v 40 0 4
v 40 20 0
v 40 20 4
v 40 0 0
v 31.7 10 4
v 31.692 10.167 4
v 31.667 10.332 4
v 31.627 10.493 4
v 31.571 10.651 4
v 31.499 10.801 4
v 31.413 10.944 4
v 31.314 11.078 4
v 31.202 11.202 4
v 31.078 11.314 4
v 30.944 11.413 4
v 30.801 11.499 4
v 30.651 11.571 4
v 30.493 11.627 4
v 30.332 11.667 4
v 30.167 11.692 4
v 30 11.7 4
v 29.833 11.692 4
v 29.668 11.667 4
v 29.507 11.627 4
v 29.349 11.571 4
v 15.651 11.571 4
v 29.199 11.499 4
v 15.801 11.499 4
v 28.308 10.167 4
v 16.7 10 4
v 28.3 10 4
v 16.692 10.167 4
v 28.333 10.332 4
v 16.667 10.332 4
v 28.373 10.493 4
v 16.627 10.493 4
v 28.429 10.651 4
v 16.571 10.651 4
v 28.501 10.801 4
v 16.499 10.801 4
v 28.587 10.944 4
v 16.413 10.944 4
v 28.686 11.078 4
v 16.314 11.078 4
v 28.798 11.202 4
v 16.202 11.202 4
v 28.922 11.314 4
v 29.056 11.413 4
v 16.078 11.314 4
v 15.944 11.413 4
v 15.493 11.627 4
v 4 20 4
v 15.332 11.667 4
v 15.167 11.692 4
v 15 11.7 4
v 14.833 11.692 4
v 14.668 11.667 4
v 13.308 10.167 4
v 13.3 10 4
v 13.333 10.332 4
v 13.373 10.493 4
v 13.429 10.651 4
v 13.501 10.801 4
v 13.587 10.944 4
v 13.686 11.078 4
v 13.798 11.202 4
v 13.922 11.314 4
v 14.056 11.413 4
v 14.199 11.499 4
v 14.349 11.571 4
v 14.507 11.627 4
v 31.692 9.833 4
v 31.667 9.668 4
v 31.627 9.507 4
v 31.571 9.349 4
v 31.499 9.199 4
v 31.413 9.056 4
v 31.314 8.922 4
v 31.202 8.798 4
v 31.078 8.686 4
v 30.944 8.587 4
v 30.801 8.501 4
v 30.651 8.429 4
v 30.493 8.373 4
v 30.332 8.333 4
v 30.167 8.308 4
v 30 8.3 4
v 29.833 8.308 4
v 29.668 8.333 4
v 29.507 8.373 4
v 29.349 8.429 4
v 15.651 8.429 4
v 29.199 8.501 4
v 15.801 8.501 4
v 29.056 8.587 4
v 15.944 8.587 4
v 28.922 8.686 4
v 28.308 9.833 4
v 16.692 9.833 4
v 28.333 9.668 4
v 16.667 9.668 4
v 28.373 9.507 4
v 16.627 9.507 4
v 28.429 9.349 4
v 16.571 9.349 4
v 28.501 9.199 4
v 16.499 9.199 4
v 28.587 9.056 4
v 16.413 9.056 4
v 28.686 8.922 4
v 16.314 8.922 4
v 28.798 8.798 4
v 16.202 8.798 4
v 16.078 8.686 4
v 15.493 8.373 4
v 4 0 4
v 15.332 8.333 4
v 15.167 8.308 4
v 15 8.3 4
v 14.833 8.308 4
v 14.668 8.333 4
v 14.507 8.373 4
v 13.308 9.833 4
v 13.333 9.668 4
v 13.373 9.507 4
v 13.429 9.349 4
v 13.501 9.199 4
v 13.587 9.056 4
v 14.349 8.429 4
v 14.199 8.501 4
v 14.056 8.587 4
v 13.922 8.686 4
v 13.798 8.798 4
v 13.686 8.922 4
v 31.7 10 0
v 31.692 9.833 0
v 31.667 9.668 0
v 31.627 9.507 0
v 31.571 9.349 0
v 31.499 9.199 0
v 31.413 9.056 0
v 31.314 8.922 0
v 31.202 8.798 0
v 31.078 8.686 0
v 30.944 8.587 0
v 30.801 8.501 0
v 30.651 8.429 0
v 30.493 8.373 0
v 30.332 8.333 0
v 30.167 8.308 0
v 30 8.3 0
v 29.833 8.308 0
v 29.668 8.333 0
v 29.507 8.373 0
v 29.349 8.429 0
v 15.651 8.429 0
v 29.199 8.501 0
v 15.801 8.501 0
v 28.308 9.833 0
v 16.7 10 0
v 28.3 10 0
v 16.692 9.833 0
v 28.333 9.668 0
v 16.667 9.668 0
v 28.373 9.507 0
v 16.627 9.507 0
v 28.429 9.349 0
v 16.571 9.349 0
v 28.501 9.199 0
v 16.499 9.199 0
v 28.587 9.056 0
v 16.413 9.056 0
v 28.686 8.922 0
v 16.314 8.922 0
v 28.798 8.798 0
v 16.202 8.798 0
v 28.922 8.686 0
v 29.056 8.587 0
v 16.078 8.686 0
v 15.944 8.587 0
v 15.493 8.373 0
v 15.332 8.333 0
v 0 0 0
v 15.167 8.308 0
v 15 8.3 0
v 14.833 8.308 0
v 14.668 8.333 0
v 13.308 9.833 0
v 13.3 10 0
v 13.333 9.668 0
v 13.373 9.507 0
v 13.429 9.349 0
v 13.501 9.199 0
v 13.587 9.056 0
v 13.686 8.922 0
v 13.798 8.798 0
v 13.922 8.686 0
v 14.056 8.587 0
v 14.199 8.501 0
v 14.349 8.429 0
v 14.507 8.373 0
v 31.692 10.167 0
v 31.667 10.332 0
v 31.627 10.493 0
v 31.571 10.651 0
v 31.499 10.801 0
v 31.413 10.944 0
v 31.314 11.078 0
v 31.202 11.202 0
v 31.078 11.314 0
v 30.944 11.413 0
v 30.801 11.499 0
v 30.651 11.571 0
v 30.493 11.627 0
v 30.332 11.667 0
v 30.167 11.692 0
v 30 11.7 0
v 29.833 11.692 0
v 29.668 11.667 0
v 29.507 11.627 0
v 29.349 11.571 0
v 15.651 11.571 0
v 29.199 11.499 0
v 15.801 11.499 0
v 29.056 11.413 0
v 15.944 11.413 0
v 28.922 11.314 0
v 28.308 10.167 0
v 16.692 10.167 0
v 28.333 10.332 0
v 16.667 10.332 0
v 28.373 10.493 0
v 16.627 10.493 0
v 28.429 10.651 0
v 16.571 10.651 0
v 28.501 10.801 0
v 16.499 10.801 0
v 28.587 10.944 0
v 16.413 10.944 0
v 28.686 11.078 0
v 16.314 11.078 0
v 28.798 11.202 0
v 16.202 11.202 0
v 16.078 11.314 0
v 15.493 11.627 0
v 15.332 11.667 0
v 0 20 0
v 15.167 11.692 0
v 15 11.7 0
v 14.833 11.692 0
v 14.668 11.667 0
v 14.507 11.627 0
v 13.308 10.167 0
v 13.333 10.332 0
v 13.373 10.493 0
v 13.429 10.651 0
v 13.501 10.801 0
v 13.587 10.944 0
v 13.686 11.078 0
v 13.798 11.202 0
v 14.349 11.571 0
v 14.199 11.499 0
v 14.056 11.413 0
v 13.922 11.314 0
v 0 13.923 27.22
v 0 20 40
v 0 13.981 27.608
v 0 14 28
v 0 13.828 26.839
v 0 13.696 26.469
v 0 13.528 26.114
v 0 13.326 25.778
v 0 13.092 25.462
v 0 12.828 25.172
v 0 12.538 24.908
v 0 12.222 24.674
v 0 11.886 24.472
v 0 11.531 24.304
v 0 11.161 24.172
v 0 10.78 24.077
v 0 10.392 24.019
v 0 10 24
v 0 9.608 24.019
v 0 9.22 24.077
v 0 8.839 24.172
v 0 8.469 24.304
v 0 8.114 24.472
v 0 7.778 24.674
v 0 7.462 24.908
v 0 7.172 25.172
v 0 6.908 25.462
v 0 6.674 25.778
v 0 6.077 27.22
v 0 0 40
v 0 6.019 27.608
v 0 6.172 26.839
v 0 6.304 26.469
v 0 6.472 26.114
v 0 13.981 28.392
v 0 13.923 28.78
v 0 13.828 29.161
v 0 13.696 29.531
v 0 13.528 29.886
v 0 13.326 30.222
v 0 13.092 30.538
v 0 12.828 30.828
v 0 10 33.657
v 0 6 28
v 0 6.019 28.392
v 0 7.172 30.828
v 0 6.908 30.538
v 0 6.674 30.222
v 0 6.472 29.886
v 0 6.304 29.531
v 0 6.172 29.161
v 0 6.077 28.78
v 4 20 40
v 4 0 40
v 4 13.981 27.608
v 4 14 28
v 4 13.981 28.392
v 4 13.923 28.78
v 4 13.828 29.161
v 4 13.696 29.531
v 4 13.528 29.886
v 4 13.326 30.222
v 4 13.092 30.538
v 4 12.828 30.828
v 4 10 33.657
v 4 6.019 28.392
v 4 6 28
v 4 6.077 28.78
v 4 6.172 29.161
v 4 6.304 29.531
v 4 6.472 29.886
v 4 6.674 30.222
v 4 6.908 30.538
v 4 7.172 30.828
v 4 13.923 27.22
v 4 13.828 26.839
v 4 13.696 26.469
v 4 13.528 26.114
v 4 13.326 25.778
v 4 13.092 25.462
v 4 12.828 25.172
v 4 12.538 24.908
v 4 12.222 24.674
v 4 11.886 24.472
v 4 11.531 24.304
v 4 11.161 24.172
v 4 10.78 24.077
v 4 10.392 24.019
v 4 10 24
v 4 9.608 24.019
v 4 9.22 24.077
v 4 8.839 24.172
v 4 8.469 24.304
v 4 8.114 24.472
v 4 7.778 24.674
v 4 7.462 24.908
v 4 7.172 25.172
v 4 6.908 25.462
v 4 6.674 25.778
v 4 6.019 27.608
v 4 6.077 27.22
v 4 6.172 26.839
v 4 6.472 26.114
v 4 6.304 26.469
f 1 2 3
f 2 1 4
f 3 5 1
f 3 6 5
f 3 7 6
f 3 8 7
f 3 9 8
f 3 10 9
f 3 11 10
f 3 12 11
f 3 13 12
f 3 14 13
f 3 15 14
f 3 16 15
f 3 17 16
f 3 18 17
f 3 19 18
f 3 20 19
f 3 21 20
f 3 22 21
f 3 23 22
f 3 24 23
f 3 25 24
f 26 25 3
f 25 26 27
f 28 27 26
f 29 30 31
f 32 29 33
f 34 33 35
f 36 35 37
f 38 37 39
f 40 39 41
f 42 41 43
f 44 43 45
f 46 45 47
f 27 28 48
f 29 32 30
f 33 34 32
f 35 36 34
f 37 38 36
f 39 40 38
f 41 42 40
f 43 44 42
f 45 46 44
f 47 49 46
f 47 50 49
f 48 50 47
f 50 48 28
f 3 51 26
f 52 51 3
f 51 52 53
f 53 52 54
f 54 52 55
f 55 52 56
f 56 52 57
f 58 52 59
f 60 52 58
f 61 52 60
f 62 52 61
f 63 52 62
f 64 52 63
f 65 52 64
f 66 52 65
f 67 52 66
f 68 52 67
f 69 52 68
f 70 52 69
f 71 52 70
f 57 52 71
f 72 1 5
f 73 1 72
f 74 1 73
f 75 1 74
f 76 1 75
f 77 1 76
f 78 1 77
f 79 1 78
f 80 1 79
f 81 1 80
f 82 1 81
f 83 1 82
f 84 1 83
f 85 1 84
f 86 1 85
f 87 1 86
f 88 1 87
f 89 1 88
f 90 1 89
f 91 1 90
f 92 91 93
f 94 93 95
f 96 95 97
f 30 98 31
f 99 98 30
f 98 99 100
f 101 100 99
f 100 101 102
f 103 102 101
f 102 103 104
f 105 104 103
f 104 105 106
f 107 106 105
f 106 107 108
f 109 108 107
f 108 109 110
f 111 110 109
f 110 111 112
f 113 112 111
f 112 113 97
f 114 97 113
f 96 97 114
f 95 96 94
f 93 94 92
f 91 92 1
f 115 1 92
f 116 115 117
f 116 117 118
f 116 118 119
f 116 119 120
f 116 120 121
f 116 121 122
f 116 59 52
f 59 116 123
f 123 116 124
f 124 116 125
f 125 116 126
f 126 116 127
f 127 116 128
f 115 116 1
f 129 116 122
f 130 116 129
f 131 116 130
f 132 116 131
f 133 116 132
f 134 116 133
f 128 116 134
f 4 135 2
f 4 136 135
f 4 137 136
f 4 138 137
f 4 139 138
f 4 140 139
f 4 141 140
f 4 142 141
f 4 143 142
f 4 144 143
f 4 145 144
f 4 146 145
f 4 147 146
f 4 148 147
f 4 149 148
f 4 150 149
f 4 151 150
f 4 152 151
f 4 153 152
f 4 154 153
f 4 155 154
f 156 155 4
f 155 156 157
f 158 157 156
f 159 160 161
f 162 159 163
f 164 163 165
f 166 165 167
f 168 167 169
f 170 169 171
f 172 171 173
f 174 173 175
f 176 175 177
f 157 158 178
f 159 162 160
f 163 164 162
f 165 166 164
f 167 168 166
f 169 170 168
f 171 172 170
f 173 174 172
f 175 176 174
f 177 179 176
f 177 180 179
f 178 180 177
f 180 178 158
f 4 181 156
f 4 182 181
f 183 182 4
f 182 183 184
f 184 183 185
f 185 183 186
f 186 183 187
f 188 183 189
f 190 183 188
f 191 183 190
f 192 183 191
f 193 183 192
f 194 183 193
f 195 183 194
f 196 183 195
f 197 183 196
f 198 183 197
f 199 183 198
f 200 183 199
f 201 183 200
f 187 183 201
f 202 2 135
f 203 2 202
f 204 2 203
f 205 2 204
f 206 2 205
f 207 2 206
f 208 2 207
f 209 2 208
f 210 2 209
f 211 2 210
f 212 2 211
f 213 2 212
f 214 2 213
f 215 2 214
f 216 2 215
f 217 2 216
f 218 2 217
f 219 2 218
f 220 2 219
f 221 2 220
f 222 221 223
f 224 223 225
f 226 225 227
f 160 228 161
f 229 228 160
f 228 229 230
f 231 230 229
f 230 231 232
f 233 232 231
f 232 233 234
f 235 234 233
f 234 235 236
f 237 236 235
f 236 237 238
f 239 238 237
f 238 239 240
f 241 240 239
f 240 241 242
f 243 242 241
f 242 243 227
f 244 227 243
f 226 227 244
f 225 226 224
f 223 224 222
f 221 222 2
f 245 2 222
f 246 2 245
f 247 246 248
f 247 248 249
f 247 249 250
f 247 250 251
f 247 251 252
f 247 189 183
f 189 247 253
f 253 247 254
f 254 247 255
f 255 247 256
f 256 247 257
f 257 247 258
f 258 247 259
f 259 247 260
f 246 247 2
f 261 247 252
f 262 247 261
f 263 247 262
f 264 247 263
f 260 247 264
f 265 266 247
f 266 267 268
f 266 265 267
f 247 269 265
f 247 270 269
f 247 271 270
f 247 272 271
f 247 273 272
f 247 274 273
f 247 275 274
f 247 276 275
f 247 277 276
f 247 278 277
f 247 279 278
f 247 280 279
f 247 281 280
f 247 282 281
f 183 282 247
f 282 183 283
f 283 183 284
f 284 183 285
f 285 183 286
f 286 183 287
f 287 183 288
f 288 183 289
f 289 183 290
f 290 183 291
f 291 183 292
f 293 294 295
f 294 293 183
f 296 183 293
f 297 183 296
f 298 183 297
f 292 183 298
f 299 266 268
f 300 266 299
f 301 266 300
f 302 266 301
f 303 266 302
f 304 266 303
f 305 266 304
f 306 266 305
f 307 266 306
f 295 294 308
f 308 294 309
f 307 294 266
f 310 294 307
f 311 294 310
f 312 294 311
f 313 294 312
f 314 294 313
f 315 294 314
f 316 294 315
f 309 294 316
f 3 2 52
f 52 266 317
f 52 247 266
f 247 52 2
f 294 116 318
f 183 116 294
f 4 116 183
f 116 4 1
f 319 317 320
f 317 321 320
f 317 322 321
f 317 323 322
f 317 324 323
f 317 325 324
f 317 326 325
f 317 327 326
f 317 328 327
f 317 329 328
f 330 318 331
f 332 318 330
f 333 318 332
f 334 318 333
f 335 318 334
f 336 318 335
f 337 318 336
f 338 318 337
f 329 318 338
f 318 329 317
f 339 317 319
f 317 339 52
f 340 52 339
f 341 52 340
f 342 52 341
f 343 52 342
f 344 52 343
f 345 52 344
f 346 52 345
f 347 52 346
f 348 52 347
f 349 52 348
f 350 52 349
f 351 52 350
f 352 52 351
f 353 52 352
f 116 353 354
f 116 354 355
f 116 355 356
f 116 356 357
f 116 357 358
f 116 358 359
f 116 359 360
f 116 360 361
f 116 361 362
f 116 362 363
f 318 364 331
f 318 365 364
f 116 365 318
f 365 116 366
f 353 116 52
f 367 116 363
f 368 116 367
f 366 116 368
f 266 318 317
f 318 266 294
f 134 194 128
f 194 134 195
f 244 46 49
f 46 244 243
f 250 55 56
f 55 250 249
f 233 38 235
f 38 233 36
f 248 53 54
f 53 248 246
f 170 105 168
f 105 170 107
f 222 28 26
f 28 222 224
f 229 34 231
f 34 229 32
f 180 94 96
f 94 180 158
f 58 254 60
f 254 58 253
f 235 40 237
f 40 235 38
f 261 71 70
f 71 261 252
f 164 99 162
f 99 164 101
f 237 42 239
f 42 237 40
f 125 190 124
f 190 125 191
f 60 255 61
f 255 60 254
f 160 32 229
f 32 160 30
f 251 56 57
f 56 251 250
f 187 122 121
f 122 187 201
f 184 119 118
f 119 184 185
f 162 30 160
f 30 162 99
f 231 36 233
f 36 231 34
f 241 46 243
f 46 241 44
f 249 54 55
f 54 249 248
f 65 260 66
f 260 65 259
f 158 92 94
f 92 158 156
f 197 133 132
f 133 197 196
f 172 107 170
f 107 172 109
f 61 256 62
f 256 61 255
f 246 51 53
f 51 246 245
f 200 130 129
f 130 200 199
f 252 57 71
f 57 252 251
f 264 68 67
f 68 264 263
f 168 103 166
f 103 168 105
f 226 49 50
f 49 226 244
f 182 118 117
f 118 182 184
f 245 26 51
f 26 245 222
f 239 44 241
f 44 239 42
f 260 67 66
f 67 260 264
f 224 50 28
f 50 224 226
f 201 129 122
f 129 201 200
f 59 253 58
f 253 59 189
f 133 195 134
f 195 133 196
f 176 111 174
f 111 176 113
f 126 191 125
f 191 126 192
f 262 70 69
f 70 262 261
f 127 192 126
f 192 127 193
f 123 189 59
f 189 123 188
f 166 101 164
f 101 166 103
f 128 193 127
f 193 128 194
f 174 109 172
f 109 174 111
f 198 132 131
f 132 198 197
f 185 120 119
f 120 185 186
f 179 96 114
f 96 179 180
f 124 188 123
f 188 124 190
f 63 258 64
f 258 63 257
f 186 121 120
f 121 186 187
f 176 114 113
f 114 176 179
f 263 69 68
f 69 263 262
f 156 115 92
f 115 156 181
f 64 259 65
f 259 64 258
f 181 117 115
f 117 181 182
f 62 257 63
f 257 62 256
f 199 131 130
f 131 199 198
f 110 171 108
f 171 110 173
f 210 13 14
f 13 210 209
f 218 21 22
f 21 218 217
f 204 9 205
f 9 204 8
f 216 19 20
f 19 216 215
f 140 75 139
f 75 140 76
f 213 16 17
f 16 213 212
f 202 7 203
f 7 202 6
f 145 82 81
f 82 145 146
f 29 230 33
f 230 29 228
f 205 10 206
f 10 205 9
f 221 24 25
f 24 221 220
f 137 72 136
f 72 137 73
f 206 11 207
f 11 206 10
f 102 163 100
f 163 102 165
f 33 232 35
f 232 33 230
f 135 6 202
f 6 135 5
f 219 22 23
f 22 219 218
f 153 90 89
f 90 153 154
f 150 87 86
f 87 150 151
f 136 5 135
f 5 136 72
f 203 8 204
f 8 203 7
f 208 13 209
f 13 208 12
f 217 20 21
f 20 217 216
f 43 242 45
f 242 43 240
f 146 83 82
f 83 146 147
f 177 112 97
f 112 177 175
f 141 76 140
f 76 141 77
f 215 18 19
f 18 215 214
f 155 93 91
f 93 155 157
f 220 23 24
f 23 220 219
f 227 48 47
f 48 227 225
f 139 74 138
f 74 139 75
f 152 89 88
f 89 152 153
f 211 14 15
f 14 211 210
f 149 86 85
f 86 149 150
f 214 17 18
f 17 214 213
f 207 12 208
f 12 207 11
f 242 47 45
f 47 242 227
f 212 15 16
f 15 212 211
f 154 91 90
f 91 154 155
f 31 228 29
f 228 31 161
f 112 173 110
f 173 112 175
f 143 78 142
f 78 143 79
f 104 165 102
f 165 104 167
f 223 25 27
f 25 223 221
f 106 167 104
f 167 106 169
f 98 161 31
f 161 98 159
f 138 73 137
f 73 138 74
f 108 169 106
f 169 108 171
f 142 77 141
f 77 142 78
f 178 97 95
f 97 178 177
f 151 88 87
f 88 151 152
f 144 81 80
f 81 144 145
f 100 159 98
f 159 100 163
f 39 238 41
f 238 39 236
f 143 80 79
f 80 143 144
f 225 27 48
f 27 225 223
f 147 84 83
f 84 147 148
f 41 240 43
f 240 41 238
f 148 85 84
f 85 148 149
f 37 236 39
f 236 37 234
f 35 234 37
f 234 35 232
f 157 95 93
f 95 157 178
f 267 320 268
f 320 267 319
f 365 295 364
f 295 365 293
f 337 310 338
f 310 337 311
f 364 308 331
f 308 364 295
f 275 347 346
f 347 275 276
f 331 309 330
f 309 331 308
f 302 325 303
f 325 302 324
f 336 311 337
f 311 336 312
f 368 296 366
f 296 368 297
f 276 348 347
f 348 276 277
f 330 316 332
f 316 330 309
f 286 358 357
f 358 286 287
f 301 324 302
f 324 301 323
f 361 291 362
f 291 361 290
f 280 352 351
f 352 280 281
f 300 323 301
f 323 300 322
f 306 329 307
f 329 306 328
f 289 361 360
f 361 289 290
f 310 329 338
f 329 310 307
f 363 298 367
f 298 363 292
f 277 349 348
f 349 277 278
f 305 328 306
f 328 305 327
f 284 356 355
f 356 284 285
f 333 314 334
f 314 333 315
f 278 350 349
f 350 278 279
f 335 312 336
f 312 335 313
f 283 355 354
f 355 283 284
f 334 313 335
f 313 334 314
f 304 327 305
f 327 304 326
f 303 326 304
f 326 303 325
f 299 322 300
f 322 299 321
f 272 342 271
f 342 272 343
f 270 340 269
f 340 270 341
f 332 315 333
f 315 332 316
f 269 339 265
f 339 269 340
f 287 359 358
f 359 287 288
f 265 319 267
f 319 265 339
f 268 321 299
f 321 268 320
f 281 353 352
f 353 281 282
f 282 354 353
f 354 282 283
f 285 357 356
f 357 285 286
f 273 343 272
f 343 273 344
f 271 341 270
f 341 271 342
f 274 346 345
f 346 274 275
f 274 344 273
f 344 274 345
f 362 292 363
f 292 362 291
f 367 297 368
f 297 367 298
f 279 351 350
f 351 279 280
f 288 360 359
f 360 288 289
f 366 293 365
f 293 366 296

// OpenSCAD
// Test fixture: L bracket, clean by default. `defect` plants one known flaw.
//   "round_hole"   horizontal hole without teardrop → overhang at its top
//   "shelf"        10 × 20 mm flat ledge out of the wall at z=20 → 200 mm² roof
//   "missing_hole" one of the two plate holes gone
//   "chamfer45"    45° chamfer under the shelf instead of a flat roof → no overhang
defect = "none";
$fn = 64;

module teardrop(d) rotate([90, 0, 0]) linear_extrude(30, center = true)
  hull() { circle(d = d); rotate(45) square(d / 2); }

difference() {
  union() {
    cube([40, 20, 4]);                               // plate on the bed
    cube([4, 20, 40]);                               // wall at x=0..4
    if (defect == "shelf") translate([4, 0, 20]) cube([10, 20, 4]);
    if (defect == "chamfer45") translate([4, 0, 20]) rotate([-90, 0, 0])
      linear_extrude(20) polygon([[0, 0], [10, 0], [0, 10]]);  // 45° underside
  }
  for (x = defect == "missing_hole" ? [30] : [15, 30]) translate([x, 10, -1]) cylinder(d = 3.4, h = 6);
  // horizontal hole through the wall along X; teardrop rotated so its tip points +Z
  translate([0, 10, 28]) rotate([0, 0, 90])
    if (defect == "round_hole") rotate([90, 0, 0]) cylinder(d = 8, h = 30, center = true);
    else teardrop(8);
}
